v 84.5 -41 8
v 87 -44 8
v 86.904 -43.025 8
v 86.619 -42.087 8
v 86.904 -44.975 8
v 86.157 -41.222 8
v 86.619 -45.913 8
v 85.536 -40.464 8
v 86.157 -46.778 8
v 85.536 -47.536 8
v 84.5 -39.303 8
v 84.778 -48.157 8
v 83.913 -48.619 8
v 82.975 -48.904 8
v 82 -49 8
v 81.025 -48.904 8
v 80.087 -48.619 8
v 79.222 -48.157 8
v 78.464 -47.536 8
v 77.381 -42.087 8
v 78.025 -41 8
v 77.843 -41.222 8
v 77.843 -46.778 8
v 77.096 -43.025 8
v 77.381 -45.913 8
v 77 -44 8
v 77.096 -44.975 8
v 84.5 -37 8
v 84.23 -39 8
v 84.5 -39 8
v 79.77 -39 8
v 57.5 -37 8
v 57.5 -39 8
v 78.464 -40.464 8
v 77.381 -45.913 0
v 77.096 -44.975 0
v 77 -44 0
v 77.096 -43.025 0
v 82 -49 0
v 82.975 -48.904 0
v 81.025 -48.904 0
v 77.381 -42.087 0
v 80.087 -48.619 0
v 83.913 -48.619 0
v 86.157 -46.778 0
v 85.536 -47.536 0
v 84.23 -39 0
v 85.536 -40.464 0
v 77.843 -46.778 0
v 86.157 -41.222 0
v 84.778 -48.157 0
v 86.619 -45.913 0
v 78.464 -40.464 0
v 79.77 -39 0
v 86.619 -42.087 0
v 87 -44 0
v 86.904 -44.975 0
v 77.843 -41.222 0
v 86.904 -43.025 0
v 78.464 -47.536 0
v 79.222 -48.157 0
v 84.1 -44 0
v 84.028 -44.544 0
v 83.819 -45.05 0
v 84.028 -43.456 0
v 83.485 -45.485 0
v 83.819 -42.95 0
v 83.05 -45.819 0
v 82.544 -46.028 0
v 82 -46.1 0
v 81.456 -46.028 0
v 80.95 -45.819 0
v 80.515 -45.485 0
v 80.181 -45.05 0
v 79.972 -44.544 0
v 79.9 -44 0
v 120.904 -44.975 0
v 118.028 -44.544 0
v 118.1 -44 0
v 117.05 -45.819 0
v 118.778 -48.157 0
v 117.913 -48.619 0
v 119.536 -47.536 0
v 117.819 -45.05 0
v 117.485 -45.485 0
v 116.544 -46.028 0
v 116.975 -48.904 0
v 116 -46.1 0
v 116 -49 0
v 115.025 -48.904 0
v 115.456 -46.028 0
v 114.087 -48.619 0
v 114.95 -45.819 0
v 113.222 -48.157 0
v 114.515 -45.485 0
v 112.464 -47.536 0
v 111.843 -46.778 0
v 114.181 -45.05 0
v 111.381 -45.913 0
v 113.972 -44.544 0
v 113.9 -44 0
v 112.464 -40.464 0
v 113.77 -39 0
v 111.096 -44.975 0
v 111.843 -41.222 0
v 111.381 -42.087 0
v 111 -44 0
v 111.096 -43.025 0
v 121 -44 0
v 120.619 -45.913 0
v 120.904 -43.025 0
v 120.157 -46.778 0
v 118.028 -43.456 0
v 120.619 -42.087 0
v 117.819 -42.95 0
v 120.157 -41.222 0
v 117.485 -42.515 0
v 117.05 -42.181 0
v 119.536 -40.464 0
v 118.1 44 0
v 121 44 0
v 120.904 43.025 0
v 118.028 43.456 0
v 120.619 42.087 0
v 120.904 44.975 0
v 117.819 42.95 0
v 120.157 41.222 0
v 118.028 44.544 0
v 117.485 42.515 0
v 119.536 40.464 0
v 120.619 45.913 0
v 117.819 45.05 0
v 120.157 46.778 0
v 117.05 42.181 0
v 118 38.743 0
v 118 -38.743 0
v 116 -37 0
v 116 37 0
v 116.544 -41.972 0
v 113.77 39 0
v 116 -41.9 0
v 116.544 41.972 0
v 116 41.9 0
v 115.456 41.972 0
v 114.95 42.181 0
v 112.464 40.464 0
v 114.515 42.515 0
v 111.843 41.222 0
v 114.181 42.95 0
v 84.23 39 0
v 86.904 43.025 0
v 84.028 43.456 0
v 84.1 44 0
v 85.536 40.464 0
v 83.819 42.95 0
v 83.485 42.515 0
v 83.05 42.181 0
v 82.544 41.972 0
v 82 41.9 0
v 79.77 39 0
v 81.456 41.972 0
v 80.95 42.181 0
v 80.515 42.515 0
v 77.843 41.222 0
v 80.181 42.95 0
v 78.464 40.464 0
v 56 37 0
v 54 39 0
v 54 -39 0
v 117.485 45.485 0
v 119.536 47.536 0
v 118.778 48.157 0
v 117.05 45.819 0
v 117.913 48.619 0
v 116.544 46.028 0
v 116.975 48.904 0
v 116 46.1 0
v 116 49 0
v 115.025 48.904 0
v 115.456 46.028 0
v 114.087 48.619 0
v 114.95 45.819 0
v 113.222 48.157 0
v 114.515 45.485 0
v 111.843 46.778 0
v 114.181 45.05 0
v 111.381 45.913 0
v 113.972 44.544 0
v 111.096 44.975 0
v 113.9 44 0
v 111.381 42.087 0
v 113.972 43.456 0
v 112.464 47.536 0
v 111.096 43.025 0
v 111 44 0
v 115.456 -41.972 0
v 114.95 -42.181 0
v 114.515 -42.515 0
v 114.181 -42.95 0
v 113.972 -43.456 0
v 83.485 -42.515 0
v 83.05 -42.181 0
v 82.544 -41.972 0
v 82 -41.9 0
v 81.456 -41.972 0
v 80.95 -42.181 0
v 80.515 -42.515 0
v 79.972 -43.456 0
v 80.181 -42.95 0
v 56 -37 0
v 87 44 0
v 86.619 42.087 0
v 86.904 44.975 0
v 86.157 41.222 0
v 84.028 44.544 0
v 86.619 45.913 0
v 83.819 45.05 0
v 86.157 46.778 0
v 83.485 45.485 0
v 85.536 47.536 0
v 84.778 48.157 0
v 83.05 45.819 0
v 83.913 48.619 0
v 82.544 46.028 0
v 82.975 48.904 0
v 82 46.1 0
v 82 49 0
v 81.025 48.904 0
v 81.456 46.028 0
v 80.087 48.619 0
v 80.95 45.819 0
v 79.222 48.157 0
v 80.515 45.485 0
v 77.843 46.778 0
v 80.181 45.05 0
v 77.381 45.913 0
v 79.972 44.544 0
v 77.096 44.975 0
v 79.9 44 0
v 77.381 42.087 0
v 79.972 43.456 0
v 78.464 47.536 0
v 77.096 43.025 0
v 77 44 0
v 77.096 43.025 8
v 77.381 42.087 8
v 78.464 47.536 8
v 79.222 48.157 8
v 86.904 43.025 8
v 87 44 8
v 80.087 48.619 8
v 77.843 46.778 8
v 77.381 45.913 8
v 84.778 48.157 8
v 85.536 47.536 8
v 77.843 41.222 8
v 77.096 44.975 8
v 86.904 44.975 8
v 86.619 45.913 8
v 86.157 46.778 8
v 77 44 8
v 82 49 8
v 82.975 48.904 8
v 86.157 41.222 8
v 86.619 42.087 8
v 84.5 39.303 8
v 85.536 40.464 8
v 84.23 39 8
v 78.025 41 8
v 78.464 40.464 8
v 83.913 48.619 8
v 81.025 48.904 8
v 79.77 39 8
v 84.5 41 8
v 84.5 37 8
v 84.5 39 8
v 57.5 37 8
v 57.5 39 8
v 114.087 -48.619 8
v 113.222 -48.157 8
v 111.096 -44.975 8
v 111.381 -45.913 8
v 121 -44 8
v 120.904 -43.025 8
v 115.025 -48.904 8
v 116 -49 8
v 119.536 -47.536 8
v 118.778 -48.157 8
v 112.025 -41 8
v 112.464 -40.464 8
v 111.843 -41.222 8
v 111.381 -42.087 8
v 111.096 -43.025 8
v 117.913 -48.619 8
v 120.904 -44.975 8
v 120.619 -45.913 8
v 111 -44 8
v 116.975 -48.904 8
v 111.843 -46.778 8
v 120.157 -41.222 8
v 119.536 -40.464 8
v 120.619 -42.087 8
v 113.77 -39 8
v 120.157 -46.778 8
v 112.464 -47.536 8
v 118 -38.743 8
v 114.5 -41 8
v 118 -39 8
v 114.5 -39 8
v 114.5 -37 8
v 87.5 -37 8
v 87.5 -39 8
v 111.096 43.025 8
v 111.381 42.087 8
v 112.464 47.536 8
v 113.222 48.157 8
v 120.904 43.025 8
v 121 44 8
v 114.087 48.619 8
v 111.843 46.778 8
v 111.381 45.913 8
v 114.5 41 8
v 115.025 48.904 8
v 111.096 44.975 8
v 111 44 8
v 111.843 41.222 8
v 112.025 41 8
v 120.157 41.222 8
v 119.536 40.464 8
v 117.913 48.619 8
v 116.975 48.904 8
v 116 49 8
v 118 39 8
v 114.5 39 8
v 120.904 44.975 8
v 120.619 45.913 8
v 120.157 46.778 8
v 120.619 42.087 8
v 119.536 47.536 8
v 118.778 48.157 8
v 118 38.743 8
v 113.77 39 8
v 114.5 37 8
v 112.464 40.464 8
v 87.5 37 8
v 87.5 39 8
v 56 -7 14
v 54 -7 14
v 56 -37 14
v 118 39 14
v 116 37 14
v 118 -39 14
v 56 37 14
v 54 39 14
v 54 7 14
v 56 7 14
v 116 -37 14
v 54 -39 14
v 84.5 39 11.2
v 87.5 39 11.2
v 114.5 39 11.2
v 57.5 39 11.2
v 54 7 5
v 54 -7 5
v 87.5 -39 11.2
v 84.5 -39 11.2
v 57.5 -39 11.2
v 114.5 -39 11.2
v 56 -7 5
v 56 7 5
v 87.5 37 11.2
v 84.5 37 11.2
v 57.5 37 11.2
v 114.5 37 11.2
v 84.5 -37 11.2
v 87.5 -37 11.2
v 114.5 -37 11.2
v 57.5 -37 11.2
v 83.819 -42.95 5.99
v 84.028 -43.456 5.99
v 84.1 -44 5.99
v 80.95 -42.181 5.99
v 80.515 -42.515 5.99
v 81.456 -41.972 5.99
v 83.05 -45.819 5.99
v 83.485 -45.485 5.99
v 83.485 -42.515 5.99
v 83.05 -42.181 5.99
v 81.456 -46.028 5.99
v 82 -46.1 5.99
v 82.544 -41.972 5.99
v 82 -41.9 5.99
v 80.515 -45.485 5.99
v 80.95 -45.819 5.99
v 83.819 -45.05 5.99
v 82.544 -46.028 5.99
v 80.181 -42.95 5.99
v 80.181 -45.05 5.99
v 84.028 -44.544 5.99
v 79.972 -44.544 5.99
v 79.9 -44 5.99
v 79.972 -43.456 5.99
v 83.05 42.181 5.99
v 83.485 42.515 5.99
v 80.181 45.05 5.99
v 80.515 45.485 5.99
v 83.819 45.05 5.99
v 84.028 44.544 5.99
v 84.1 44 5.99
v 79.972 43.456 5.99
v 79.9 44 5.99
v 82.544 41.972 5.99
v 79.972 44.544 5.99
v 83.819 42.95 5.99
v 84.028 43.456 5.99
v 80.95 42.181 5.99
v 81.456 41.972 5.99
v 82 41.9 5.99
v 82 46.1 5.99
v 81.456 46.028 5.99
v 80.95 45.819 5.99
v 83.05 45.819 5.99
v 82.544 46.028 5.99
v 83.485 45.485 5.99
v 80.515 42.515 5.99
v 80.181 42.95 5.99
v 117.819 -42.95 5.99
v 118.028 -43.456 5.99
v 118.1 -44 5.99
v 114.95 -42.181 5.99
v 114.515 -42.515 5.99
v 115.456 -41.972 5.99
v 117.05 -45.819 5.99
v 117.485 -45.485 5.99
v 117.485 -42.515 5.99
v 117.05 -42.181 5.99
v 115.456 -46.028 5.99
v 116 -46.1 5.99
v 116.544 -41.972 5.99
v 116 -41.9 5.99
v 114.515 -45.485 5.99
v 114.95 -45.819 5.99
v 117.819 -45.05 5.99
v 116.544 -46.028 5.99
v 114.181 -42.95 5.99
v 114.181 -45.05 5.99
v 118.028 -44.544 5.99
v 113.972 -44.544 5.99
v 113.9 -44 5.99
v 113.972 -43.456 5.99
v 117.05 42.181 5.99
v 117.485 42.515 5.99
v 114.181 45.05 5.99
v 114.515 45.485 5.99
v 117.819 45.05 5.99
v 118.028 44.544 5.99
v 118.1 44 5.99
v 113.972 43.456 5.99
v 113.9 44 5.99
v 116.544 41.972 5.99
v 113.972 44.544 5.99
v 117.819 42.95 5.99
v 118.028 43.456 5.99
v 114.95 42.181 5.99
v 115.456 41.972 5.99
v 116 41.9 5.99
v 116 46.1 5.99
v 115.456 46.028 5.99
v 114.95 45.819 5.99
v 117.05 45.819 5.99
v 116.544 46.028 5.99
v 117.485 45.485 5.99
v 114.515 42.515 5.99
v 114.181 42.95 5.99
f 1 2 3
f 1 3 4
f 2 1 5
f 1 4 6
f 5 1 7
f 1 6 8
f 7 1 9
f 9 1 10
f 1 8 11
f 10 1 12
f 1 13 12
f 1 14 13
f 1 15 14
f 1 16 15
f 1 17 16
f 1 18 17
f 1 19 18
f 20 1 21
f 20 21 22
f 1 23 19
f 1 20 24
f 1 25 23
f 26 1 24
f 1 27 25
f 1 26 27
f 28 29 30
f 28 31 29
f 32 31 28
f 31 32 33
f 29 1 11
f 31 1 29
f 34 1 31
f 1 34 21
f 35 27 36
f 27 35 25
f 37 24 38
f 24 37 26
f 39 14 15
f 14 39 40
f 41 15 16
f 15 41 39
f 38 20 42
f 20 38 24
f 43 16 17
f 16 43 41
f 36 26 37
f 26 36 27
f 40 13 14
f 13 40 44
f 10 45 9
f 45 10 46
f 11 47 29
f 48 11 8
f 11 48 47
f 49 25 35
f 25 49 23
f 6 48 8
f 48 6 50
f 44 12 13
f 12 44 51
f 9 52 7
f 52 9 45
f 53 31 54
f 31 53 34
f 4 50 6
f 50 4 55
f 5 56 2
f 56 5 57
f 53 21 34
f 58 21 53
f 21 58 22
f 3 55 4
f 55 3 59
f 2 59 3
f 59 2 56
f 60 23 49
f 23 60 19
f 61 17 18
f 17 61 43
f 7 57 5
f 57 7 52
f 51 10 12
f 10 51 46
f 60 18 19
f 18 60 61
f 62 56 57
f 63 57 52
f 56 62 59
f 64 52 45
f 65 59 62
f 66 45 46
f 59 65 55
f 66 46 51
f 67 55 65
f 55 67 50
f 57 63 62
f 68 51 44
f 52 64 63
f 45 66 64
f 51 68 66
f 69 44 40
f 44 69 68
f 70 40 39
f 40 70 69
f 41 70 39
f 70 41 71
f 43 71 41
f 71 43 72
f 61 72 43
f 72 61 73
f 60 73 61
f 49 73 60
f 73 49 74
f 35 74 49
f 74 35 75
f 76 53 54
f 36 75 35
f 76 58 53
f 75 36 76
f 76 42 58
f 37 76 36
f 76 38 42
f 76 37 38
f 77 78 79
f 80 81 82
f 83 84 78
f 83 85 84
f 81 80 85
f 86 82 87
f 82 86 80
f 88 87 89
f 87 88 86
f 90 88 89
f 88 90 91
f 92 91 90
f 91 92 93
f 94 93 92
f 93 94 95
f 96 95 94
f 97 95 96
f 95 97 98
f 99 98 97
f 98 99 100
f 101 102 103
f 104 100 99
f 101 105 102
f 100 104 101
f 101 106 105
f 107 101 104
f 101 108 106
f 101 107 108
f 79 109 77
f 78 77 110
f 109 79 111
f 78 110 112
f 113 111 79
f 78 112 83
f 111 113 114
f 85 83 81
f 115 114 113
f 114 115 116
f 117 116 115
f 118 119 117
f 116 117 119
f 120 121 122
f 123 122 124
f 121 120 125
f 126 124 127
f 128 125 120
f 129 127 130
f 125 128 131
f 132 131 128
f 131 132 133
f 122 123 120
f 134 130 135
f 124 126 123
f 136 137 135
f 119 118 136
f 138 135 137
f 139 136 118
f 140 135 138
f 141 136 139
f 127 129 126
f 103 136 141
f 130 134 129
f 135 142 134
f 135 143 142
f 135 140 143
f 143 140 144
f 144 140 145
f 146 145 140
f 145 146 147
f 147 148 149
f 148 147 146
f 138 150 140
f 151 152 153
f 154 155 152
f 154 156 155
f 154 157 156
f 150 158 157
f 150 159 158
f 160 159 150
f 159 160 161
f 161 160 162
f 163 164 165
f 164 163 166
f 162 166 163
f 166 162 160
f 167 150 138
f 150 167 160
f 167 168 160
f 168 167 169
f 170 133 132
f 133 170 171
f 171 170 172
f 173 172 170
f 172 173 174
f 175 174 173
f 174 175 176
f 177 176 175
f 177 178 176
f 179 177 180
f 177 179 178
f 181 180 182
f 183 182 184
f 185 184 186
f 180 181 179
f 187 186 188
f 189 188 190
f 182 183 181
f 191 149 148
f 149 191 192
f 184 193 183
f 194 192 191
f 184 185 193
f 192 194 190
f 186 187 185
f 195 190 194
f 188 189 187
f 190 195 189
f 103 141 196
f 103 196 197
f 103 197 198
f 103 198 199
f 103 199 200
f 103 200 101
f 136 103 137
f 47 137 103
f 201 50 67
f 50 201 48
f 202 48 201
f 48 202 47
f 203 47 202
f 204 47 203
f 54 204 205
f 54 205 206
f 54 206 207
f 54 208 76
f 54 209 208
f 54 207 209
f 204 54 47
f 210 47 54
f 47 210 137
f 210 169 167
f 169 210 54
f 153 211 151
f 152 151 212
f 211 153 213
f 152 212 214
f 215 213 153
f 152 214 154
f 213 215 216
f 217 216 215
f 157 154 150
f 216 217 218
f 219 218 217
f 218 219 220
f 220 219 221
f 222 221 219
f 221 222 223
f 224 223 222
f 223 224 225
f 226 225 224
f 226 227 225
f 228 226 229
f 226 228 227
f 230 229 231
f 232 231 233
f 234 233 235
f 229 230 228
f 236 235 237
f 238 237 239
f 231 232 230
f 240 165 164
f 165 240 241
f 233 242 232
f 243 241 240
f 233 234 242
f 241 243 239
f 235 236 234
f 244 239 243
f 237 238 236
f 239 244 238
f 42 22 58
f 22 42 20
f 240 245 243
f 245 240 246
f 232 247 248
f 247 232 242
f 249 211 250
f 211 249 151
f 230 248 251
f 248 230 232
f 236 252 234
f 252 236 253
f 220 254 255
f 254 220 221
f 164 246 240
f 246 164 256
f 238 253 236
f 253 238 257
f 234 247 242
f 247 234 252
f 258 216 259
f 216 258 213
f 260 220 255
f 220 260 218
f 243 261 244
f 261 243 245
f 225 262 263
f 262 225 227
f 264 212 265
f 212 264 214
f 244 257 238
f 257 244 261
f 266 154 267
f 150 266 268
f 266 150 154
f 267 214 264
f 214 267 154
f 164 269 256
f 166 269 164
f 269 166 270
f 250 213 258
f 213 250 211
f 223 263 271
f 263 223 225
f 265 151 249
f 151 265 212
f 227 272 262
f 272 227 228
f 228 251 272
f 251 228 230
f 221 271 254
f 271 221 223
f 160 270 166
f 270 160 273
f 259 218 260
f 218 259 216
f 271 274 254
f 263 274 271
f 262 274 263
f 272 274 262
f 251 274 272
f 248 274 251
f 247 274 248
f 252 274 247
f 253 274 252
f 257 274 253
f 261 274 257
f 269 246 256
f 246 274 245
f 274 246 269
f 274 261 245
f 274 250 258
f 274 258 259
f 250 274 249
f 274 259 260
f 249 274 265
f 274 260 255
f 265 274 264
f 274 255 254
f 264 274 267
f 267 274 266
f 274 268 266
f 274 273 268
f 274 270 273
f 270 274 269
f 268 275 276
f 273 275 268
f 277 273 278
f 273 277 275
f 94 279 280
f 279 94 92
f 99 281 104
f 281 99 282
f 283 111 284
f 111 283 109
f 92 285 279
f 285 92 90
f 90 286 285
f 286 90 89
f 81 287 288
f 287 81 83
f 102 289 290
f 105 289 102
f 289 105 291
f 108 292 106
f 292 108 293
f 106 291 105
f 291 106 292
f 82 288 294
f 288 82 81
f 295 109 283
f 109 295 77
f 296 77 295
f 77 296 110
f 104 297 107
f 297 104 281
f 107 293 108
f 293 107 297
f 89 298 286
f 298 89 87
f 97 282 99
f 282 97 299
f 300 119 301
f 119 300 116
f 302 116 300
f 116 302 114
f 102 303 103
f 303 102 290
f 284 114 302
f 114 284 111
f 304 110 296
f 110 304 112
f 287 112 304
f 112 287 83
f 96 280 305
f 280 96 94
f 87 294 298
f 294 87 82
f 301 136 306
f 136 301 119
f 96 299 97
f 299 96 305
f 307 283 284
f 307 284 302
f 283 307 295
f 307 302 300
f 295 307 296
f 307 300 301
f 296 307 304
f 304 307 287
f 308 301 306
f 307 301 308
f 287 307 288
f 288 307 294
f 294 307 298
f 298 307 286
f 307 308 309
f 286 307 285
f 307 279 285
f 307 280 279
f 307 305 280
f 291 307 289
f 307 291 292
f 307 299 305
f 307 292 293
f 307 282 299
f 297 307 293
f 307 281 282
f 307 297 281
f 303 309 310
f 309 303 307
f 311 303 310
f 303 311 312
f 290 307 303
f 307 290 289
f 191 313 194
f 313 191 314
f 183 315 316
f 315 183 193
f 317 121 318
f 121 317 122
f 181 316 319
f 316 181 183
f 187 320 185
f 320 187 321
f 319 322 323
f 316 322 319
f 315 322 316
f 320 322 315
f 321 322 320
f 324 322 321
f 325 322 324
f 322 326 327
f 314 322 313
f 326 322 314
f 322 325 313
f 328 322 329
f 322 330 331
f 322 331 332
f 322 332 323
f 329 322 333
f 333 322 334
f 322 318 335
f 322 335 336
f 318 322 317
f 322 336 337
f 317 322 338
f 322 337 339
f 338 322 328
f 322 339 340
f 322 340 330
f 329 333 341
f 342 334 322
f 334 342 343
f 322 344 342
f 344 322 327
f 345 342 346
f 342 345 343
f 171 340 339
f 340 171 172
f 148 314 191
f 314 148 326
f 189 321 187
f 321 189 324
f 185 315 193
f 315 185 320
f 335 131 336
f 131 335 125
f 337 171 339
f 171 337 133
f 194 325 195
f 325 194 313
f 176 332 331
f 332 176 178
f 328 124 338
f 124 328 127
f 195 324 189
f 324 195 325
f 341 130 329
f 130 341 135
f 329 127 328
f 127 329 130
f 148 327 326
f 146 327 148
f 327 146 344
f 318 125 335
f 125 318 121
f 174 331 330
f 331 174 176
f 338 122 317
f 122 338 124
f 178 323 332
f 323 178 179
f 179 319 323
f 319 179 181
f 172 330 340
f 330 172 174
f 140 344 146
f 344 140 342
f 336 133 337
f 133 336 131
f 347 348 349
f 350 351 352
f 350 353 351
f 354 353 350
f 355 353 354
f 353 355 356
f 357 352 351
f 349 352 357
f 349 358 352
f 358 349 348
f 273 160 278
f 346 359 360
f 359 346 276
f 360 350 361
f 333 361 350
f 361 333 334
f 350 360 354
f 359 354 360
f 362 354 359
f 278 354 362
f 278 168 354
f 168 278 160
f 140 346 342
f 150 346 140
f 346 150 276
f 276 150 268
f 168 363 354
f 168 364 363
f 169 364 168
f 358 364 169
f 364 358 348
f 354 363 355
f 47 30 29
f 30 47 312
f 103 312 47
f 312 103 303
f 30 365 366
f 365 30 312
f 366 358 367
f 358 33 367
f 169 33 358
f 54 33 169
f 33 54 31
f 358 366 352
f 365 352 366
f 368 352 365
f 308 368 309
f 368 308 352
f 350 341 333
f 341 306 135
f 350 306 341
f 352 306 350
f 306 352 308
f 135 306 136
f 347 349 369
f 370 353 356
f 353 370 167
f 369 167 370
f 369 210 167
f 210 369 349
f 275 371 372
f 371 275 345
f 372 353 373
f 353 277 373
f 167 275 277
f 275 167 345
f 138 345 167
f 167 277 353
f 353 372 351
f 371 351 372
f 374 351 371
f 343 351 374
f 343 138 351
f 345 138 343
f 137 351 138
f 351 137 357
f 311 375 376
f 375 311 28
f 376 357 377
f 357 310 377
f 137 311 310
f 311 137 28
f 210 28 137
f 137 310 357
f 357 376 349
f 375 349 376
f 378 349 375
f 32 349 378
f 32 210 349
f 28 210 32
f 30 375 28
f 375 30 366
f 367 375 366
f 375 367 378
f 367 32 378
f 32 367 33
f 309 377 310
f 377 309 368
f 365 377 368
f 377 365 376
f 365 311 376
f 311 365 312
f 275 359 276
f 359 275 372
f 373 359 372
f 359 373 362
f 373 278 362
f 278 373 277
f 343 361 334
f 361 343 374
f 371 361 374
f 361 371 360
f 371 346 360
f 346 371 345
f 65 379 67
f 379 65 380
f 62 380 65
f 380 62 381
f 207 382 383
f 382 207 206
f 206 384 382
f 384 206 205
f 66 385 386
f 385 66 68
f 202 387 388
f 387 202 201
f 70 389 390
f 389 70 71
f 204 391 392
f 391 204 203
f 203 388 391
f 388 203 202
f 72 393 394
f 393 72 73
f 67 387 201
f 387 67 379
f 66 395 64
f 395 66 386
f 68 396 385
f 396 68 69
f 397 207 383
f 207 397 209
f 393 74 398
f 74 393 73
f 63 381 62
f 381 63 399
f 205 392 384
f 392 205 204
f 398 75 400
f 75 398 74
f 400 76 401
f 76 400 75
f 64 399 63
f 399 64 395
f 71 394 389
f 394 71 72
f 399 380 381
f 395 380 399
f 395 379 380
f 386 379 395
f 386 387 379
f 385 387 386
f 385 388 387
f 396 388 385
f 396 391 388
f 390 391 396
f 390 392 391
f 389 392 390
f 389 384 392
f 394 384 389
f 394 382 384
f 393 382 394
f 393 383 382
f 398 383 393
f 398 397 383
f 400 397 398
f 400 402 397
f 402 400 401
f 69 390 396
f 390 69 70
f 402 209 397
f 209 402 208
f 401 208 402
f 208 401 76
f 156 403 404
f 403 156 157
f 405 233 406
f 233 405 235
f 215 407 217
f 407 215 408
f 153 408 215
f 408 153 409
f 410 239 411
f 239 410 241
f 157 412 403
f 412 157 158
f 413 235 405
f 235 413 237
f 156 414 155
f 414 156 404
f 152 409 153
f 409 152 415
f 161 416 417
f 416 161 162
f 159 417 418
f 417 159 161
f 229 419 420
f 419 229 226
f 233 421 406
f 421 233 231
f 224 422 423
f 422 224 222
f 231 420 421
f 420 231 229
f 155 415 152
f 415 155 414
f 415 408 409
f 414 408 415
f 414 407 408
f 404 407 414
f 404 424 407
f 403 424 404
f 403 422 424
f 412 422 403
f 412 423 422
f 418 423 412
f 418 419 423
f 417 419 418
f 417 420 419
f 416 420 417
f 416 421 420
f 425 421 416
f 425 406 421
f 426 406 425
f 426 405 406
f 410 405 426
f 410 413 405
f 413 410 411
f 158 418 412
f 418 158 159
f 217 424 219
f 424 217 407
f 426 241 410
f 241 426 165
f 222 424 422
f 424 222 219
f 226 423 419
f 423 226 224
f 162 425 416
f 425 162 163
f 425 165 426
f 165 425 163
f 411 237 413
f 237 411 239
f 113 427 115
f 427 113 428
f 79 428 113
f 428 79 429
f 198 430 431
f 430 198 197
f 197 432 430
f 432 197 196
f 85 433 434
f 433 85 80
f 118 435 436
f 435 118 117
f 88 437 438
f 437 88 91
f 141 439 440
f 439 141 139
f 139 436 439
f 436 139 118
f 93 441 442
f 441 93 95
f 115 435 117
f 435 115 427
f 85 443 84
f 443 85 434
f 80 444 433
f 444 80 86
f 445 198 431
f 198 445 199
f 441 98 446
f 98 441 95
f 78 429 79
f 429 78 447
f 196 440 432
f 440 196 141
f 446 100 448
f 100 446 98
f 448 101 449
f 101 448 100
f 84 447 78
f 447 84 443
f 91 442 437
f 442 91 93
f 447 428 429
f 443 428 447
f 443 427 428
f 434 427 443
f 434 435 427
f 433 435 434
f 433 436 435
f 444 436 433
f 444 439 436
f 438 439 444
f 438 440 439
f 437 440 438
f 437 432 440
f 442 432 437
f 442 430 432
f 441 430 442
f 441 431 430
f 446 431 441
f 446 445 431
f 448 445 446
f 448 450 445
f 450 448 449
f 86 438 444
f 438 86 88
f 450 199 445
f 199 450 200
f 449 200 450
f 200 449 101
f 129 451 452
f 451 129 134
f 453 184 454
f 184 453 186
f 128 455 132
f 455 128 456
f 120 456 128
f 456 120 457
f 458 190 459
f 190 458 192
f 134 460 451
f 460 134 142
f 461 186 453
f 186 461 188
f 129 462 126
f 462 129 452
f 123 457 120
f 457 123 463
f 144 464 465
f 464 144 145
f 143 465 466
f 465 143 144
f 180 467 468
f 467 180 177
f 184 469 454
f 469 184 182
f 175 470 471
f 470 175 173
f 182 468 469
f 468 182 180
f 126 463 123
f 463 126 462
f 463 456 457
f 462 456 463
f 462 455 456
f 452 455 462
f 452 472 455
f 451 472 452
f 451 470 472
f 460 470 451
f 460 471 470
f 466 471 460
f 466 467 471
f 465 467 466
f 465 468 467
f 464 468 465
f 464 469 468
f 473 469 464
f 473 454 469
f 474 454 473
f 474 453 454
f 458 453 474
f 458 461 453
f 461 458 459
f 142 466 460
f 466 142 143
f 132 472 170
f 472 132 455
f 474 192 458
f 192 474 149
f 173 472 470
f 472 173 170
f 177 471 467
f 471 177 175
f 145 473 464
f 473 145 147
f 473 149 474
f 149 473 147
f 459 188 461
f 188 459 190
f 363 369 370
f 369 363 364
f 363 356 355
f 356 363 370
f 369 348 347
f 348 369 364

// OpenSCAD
// =====================================================================
//  robot base :: battery tray (print 1)
//  Low-walled frame (no floor: the pack sits on the floor plate, rb_batt_z0)
//  around the 58 x 72 x 40 pack (+1 mm clearance per side), walls 2 mm x 14 high.
//  2 strap slots (27 x 3.2) in the +-Y walls at x = pack centre -/+ 15 for a 25 mm
//  hook-and-loop strap over the pack; U-notch in the rear (-X) wall for the BMS wires.
//  Fixing: 4 ears, M3 inserts in the bottom at rb_fix_batt (M3x10 from below).
//  Print orientation: assembled (frame on the bed), no supports (slots bridge 27 mm).
//  robot_batt_tray()  robot frame.
// =====================================================================
include <../lib/params.scad>
include <../lib/robot_params.scad>

rbbt_wall = 2;  rbbt_h = 14;  rbbt_ear_h = 8;
module robot_batt_tray() {
    cx = rb_batt_xy[0]; cy = rb_batt_xy[1]; z0 = rb_batt_z0;
    iw = [rb_batt[0] + 2, rb_batt[1] + 2];
    difference() {
        union() {
            translate([cx, cy, z0]) linear_extrude(rbbt_h) difference() {
                square([iw[0] + 2 * rbbt_wall, iw[1] + 2 * rbbt_wall], center = true);
                square(iw, center = true);
            }
            for (p = rb_fix_batt) {
                translate([0, 0, z0]) linear_extrude(rbbt_ear_h)
                    hull() { translate(p) circle(r = 5, $fn = 32);
                             translate([p[0], cy + (p[1] > cy ? 1 : -1) * (iw[1] / 2 + rbbt_wall / 2)]) circle(r = 1, $fn = 16); }   // ear -> side wall at the same x
            }
        }
        for (s = [-1, 1], dx = [-15, 15])
            translate([cx + dx - 13.5, cy + s * (iw[1] / 2 + rbbt_wall / 2) - 3, z0 + 8]) cube([27, 6, 3.2]);
        translate([cx - iw[0] / 2 - rbbt_wall - 1, cy - 7, z0 + 5]) cube([rbbt_wall + 2, 14, 20]);
        for (p = rb_fix_batt) translate([p[0], p[1], z0 - 0.01]) cylinder(h = m3_insert_h + 1, d = m3_insert_d, $fn = 24);
    }
}

module robot_batt_tray_print() { translate([0, 0, -rb_batt_z0]) robot_batt_tray(); }

robot_batt_tray_print();
